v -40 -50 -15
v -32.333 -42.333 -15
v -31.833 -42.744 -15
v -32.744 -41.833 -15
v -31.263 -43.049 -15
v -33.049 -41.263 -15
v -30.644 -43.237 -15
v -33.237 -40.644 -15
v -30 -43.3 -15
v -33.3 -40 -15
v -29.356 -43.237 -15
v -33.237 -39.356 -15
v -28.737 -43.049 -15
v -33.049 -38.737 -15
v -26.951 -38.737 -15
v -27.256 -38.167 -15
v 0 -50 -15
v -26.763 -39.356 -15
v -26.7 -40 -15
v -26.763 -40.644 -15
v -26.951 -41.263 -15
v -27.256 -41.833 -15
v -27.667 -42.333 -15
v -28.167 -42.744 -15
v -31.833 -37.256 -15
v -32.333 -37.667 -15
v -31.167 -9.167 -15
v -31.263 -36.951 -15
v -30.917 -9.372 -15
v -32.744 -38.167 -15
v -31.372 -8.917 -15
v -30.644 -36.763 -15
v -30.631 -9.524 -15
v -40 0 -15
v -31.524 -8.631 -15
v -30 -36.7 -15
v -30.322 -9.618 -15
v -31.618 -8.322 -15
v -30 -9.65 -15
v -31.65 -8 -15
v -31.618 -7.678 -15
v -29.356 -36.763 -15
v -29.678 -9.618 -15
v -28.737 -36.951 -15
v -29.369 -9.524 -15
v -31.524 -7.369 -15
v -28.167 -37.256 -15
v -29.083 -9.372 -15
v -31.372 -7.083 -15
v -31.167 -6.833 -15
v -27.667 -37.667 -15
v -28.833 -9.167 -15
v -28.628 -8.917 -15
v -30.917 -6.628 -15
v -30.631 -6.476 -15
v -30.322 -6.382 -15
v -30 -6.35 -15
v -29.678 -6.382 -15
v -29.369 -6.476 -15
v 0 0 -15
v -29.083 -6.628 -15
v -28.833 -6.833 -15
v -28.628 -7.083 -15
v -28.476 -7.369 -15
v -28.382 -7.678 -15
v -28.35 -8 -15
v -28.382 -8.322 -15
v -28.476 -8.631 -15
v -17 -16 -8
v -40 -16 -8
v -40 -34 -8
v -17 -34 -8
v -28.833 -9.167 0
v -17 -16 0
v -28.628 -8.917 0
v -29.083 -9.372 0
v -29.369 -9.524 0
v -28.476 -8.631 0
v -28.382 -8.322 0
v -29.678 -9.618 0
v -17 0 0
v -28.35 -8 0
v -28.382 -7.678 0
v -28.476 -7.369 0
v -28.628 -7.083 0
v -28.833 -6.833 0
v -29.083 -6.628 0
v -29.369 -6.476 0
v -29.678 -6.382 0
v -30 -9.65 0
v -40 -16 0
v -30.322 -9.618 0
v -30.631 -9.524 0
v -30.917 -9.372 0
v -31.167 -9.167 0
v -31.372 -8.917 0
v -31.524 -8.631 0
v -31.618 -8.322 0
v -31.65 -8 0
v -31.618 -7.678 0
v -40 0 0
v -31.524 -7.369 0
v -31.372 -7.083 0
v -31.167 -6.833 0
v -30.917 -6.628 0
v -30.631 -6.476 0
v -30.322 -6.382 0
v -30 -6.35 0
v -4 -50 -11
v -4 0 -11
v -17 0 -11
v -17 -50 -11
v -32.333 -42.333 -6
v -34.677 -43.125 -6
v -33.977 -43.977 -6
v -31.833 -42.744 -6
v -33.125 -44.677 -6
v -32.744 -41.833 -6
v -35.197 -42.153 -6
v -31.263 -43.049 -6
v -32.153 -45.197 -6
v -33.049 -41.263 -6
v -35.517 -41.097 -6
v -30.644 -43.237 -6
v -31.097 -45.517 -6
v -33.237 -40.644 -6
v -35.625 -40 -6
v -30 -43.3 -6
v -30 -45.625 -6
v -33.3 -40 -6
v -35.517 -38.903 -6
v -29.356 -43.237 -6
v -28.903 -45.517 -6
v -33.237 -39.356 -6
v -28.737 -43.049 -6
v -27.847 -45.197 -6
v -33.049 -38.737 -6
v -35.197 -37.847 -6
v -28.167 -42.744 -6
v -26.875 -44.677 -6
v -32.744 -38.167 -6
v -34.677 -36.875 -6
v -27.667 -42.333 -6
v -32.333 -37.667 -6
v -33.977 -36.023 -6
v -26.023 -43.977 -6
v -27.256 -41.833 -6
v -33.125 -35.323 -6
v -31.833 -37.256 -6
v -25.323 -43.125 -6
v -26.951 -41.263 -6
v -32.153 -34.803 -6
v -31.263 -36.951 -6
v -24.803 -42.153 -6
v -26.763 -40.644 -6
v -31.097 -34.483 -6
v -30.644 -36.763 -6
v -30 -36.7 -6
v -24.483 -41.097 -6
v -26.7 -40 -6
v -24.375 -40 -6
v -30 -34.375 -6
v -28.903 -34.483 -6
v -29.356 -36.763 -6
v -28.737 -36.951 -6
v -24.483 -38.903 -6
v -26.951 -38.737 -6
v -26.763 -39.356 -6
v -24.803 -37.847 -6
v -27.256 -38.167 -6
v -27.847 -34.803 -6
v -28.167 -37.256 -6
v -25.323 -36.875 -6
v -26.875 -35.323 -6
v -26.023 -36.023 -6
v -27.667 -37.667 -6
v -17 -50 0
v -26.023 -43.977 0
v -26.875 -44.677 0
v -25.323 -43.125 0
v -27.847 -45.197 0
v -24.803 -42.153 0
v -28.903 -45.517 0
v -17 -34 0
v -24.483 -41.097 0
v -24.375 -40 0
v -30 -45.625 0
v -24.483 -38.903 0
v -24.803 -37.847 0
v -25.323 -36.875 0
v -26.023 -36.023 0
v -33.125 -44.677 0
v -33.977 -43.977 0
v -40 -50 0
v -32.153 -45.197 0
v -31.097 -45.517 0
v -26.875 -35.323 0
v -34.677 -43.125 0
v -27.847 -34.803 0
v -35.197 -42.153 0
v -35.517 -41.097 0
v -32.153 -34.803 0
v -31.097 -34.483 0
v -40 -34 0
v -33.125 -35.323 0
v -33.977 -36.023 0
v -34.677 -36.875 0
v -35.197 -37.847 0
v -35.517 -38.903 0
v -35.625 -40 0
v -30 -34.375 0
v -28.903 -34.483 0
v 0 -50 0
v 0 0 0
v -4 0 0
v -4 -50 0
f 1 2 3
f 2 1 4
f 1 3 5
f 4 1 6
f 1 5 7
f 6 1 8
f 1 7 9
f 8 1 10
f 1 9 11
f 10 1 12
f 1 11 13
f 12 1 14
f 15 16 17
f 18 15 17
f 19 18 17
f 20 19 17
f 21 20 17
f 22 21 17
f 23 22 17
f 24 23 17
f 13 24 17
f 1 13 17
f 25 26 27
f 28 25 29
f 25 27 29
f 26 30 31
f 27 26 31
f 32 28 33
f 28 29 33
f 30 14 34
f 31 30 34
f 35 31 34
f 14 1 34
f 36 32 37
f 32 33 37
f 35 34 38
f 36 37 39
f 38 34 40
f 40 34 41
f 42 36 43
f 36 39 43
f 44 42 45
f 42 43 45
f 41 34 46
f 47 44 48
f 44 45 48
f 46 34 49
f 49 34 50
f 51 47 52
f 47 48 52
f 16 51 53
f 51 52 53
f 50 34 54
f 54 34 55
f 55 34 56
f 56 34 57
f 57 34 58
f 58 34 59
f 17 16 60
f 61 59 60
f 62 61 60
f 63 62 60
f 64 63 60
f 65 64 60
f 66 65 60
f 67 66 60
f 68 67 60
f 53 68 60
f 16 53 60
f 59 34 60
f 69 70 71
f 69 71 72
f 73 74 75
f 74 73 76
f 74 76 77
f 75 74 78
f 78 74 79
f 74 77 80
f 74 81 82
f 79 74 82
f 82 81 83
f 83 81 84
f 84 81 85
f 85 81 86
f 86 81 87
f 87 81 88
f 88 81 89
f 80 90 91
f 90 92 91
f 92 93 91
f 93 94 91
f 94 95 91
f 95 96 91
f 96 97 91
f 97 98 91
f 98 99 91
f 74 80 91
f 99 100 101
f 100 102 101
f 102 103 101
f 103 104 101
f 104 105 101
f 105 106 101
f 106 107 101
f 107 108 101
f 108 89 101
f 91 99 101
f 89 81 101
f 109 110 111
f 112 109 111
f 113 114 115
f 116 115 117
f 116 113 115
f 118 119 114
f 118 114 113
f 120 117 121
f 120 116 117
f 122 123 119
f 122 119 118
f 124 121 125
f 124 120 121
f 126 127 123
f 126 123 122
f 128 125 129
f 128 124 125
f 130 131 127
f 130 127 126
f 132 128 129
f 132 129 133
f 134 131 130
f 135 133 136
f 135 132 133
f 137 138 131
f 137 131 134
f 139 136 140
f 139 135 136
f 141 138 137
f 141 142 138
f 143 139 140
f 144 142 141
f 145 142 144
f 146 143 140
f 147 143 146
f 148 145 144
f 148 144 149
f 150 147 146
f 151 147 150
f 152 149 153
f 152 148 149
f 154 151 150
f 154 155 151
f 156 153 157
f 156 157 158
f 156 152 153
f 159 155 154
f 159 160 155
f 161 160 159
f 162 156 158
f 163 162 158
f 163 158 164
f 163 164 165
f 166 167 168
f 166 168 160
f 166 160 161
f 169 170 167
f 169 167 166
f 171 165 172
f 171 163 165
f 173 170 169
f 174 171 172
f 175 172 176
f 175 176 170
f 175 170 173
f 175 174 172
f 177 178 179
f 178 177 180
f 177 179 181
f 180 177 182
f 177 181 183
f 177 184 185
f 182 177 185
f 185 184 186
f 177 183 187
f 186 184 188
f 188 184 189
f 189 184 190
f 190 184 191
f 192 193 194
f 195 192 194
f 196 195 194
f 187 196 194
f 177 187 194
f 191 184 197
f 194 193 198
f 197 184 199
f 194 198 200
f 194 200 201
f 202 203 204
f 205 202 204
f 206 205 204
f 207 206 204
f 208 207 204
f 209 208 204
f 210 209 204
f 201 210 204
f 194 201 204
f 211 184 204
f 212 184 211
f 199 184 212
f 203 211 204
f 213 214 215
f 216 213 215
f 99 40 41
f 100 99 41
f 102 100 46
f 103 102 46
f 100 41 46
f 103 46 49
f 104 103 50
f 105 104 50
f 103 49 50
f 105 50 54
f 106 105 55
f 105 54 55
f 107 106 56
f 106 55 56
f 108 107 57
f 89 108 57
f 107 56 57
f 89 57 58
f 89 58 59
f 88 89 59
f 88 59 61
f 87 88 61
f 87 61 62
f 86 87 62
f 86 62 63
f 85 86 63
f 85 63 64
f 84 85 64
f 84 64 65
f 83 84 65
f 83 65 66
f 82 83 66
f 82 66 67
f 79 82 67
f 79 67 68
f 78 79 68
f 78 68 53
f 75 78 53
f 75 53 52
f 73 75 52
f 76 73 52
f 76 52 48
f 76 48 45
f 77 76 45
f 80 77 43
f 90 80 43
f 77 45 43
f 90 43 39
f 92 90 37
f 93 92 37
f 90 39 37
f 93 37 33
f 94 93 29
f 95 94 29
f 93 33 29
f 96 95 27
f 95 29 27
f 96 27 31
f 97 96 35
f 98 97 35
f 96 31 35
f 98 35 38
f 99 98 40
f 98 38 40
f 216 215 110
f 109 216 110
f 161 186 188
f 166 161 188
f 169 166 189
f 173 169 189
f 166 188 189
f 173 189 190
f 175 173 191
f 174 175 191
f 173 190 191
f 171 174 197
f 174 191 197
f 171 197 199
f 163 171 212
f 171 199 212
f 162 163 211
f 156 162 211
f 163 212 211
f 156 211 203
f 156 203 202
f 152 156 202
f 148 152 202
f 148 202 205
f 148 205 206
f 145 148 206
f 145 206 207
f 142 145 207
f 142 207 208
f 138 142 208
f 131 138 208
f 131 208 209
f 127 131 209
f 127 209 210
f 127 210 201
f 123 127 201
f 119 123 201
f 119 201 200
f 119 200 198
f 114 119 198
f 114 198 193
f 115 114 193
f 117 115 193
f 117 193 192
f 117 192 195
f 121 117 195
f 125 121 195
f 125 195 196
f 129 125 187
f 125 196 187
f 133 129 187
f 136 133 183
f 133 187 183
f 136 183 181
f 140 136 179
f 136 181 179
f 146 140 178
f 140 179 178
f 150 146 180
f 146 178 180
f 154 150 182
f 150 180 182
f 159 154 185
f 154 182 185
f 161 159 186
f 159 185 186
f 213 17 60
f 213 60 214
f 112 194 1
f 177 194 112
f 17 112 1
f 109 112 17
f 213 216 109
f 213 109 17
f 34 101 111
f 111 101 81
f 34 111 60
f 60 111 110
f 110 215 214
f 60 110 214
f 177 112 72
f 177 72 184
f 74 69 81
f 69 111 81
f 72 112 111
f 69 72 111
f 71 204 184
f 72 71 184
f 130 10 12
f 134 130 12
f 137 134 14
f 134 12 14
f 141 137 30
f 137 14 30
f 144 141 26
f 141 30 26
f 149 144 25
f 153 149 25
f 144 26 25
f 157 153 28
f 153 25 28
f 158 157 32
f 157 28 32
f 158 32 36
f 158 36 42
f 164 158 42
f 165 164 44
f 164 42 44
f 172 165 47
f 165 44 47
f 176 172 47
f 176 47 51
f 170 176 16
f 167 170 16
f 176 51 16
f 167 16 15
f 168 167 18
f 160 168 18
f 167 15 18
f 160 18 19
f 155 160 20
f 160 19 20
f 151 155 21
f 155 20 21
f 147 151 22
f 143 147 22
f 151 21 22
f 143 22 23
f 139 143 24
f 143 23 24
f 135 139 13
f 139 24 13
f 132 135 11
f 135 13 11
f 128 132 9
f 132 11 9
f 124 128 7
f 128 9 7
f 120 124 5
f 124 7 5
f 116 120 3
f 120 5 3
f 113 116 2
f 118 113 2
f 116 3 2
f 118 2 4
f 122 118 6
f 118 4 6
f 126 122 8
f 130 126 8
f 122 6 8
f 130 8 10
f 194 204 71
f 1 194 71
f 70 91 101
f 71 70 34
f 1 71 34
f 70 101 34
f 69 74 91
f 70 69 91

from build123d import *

# Parameters (mm, degrees)
F1_DEPTH       = 50
F3_DEPTH       = 8
F5_D           = 6.6
F5_CBORE_D     = 11.25
F5_CBORE_DEPTH = 6
F7_D           = 3.3
F8_DEPTH       = 15


with BuildPart() as f1:
    # F0 (on Front) → F1 (new body)
    with BuildSketch(Plane.XZ):
        Polygon((0, -30), (0, 0), (-4, 0), (-4, -11), (-17, -11), (-17, 0), (-40, 0), (-40, -30), align=None)
    extrude(amount=F1_DEPTH)

    # F2 (on face) → F3 (cut)
    with BuildSketch(Plane.XY):
        Polygon((-40, -16), (-40, -25), (-40, -34), (-17, -34), (-17, -16), align=None)
    extrude(amount=-F3_DEPTH, mode=Mode.SUBTRACT)

    # F5 (through all)
    with Locations(Plane.XY):
        with Locations((-30, -40)):
            CounterBoreHole(F5_D / 2, F5_CBORE_D / 2, F5_CBORE_DEPTH)

    # F7 (through all)
    with Locations(Plane.XY):
        with Locations((-30, -8)):
            Hole(F7_D / 2)

    # F8 (cut): a face of the model
    f8_faces = [f1.faces().sort_by_distance(p)[0] for p in [
        (-19.7815033531, -24.8120928837, -30),
    ]]
    extrude(f8_faces, amount=-F8_DEPTH, mode=Mode.SUBTRACT)


solid = f1.part
